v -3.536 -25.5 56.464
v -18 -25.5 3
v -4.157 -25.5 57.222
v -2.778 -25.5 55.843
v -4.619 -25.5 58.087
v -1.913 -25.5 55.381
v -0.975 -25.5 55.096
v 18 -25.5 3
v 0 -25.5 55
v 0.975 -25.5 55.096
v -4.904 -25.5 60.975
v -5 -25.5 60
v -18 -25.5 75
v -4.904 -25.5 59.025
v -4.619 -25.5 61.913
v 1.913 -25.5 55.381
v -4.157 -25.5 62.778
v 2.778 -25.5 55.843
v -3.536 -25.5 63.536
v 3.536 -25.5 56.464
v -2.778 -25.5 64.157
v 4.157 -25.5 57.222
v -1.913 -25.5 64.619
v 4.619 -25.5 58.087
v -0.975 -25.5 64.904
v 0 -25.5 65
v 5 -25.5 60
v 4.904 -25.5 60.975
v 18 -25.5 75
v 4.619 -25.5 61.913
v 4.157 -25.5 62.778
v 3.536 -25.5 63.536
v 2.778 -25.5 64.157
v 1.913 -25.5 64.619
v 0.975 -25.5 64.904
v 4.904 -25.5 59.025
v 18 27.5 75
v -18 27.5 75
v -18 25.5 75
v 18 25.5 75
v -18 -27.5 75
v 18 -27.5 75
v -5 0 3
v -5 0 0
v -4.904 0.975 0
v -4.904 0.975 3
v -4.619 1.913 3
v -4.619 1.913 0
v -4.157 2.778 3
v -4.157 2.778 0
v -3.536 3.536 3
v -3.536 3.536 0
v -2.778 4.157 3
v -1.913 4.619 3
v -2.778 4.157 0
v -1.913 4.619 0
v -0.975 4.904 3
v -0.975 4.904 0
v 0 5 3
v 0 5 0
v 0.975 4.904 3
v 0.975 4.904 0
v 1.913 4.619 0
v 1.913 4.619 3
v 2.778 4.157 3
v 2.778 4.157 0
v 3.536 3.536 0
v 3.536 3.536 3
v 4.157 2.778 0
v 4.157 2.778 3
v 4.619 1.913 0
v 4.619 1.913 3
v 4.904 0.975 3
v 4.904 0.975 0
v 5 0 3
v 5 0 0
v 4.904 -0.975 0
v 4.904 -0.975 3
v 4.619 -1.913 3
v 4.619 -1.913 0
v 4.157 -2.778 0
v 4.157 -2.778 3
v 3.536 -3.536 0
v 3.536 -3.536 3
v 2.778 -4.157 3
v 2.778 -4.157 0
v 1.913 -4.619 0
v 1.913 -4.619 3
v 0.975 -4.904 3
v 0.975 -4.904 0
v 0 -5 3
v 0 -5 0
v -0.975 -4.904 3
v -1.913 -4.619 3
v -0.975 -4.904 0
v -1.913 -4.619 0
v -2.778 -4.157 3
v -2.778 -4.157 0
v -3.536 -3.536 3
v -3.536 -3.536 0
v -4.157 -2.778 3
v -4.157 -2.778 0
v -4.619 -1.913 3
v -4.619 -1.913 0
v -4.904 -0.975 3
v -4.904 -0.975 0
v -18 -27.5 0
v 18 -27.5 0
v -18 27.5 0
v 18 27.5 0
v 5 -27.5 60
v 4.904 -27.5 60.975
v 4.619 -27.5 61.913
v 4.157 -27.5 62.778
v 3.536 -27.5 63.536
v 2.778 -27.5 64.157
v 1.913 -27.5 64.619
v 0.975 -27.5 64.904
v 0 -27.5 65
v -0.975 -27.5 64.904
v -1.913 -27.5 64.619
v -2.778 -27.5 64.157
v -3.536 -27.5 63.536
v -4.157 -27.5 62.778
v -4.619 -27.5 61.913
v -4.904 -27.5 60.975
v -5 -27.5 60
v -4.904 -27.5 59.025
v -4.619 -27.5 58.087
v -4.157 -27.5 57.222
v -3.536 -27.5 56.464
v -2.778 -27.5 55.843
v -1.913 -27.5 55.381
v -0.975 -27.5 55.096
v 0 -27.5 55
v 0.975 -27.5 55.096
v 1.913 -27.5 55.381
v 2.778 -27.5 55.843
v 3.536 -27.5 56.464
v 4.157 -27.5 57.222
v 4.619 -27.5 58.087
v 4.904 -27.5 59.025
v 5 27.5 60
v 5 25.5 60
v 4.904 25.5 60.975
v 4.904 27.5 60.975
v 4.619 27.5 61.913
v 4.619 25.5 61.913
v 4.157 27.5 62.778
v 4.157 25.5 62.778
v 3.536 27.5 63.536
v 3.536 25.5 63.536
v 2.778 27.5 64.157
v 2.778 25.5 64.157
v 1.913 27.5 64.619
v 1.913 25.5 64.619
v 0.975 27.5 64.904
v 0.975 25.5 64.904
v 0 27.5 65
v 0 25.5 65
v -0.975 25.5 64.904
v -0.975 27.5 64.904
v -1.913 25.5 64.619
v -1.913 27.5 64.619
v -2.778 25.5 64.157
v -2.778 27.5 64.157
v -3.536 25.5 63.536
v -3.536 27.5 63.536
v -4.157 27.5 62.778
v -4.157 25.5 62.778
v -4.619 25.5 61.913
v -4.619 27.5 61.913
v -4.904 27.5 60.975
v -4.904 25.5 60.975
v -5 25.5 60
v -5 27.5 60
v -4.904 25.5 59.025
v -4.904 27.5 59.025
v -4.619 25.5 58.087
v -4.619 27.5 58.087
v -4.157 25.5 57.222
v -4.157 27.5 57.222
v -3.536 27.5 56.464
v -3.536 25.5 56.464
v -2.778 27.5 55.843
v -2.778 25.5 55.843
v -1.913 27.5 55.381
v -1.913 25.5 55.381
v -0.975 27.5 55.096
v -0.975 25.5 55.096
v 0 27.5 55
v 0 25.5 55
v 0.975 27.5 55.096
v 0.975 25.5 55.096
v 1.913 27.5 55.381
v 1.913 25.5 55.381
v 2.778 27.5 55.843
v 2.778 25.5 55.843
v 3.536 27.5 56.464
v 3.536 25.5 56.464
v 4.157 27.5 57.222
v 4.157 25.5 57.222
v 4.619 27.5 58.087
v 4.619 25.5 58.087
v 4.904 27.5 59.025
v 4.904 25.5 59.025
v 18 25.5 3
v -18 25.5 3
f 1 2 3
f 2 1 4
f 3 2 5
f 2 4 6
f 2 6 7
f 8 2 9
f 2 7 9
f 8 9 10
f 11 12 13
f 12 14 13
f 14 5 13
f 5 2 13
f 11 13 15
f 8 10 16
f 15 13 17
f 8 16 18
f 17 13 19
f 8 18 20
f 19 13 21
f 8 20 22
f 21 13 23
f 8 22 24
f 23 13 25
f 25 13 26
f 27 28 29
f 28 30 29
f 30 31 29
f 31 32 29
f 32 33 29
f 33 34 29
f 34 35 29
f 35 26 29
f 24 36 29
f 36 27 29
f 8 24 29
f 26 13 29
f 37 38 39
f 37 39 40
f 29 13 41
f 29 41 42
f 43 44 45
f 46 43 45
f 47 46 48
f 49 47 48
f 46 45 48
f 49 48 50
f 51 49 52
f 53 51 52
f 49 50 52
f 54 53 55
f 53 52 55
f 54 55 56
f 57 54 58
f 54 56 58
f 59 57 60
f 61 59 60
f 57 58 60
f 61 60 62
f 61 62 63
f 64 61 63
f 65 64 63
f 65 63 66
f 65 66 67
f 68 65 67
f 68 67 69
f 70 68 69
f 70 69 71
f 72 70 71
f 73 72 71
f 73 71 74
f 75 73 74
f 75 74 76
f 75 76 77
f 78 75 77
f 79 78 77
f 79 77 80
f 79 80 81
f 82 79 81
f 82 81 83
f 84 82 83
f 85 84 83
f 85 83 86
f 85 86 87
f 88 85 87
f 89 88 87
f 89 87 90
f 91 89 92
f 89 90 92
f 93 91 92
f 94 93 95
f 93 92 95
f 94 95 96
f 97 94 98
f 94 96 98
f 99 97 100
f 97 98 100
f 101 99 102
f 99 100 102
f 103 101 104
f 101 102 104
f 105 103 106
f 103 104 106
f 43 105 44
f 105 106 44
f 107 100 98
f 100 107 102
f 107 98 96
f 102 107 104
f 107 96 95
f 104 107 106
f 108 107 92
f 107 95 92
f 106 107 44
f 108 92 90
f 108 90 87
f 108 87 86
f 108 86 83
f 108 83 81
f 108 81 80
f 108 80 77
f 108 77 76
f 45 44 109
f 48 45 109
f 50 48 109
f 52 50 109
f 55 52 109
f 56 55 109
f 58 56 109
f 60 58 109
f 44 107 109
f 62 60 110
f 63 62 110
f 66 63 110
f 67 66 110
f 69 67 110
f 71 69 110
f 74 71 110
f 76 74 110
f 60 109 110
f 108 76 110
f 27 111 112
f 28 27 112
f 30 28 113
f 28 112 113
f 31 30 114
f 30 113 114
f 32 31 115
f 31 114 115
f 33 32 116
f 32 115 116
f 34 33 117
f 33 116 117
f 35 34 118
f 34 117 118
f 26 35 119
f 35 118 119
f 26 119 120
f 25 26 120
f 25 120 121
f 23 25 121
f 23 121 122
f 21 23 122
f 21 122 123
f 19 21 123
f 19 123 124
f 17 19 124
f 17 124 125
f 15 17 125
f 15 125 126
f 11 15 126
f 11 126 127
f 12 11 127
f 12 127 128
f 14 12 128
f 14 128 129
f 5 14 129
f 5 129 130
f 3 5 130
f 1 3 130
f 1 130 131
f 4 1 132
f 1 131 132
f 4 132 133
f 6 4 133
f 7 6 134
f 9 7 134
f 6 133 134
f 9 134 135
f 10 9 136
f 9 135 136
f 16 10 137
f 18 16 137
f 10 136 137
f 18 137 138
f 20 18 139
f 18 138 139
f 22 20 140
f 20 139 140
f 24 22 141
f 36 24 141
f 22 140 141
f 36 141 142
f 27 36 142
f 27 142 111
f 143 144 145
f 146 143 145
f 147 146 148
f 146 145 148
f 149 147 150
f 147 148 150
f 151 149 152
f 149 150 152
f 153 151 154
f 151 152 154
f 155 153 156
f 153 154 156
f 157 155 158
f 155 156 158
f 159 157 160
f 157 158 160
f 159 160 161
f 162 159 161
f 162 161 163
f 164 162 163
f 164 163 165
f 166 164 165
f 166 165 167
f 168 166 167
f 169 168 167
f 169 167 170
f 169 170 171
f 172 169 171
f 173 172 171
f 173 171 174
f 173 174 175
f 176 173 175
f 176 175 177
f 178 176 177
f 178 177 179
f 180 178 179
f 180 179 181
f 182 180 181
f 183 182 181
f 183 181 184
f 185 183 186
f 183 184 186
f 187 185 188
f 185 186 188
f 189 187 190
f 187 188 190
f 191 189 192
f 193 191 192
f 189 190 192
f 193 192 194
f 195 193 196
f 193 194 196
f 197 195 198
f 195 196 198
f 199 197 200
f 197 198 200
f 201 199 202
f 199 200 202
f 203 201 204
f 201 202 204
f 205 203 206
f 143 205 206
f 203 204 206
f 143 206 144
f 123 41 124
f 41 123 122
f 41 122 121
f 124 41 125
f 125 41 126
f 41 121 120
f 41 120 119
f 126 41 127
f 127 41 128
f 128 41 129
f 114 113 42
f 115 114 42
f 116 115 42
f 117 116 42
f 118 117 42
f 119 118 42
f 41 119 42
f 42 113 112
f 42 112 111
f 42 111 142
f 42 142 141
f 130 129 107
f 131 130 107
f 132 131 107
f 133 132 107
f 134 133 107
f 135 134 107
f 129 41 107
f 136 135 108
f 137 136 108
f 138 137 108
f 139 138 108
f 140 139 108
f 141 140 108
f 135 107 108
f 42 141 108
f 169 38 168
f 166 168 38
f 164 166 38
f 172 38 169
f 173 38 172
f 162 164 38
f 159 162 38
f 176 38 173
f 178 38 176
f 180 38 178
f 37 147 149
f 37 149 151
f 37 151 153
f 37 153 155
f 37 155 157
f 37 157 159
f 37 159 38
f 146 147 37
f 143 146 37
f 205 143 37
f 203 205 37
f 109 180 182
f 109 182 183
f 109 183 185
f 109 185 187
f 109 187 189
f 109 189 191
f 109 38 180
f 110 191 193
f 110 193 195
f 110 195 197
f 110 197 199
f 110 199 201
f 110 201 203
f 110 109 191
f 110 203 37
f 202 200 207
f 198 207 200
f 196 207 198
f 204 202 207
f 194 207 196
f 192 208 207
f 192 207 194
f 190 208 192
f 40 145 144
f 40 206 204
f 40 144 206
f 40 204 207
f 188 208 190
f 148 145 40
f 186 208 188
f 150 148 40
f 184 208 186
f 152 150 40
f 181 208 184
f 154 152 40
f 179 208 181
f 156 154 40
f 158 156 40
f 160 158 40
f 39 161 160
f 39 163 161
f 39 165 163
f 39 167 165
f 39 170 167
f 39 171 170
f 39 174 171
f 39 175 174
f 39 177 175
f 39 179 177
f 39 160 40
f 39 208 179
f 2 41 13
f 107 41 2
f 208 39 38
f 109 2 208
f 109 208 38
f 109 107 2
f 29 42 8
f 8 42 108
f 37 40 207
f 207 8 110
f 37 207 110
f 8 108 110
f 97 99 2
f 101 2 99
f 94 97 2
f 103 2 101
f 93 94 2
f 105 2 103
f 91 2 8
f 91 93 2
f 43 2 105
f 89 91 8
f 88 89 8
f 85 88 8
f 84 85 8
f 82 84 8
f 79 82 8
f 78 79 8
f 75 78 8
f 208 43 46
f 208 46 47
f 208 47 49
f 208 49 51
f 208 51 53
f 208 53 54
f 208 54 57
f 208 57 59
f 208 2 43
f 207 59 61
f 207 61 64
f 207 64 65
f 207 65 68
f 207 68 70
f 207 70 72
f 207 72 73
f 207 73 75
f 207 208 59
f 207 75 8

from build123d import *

# Parameters (mm, degrees)
ESBO_O1_W                = 36
ESBO_O1_H                = 55
RESSALTO_EXTRUS_O1_DEPTH = 75
ESBO_O2_W                = 34
ESBO_O2_H                = 30
CORTE_EXTRUS_O1_DEPTH    = 56
ESBO_O3_W                = 56
ESBO_O3_H                = 51
CORTE_EXTRUS_O2_DEPTH    = 57
ESBO_O5_R                = 5
CORTE_EXTRUS_O4_DEPTH    = 57
ESBO_O6_W                = 36
ESBO_O6_H                = 51
CORTE_EXTRUS_O5_DEPTH    = 16
ESBO_O4_R                = 5
CORTE_EXTRUS_O6_DEPTH    = 63


with BuildPart() as part:
    # Esboço1 → Ressalto-extrusão1 (new body)
    with BuildSketch(Plane.XY):
        Rectangle(ESBO_O1_W, ESBO_O1_H)
    extrude(amount=RESSALTO_EXTRUS_O1_DEPTH)

    # Esboço2 → Corte-extrusão1 (cut)
    with BuildSketch(Plane.XY.offset(75)):
        Rectangle(ESBO_O2_W, ESBO_O2_H)
    extrude(amount=-CORTE_EXTRUS_O1_DEPTH, mode=Mode.SUBTRACT)

    # Esboço3 → Corte-extrusão2 (cut)
    with BuildSketch(Plane.ZY.offset(18)):
        with Locations((47, 0)):
            Rectangle(ESBO_O3_W, ESBO_O3_H)
    extrude(amount=-CORTE_EXTRUS_O2_DEPTH, mode=Mode.SUBTRACT)

    # Esboço5 → Corte-extrusão4 (cut)
    with BuildSketch(Plane(origin=(0, 0, 0), x_dir=(-1, 0, 0), z_dir=(0, 0, -1))):
        Circle(ESBO_O5_R)
    extrude(amount=-CORTE_EXTRUS_O4_DEPTH, mode=Mode.SUBTRACT)

    # Esboço6 → Corte-extrusão5 (cut)
    with BuildSketch(Plane.XY.offset(19)):
        Rectangle(ESBO_O6_W, ESBO_O6_H)
    extrude(amount=-CORTE_EXTRUS_O5_DEPTH, mode=Mode.SUBTRACT)

    # Esboço4 → Corte-extrusão6 (cut)
    with BuildSketch(Plane.XZ.offset(27.5)):
        with Locations((0, 60)):
            Circle(ESBO_O4_R)
    extrude(amount=-CORTE_EXTRUS_O6_DEPTH, mode=Mode.SUBTRACT)


solid = part.part
